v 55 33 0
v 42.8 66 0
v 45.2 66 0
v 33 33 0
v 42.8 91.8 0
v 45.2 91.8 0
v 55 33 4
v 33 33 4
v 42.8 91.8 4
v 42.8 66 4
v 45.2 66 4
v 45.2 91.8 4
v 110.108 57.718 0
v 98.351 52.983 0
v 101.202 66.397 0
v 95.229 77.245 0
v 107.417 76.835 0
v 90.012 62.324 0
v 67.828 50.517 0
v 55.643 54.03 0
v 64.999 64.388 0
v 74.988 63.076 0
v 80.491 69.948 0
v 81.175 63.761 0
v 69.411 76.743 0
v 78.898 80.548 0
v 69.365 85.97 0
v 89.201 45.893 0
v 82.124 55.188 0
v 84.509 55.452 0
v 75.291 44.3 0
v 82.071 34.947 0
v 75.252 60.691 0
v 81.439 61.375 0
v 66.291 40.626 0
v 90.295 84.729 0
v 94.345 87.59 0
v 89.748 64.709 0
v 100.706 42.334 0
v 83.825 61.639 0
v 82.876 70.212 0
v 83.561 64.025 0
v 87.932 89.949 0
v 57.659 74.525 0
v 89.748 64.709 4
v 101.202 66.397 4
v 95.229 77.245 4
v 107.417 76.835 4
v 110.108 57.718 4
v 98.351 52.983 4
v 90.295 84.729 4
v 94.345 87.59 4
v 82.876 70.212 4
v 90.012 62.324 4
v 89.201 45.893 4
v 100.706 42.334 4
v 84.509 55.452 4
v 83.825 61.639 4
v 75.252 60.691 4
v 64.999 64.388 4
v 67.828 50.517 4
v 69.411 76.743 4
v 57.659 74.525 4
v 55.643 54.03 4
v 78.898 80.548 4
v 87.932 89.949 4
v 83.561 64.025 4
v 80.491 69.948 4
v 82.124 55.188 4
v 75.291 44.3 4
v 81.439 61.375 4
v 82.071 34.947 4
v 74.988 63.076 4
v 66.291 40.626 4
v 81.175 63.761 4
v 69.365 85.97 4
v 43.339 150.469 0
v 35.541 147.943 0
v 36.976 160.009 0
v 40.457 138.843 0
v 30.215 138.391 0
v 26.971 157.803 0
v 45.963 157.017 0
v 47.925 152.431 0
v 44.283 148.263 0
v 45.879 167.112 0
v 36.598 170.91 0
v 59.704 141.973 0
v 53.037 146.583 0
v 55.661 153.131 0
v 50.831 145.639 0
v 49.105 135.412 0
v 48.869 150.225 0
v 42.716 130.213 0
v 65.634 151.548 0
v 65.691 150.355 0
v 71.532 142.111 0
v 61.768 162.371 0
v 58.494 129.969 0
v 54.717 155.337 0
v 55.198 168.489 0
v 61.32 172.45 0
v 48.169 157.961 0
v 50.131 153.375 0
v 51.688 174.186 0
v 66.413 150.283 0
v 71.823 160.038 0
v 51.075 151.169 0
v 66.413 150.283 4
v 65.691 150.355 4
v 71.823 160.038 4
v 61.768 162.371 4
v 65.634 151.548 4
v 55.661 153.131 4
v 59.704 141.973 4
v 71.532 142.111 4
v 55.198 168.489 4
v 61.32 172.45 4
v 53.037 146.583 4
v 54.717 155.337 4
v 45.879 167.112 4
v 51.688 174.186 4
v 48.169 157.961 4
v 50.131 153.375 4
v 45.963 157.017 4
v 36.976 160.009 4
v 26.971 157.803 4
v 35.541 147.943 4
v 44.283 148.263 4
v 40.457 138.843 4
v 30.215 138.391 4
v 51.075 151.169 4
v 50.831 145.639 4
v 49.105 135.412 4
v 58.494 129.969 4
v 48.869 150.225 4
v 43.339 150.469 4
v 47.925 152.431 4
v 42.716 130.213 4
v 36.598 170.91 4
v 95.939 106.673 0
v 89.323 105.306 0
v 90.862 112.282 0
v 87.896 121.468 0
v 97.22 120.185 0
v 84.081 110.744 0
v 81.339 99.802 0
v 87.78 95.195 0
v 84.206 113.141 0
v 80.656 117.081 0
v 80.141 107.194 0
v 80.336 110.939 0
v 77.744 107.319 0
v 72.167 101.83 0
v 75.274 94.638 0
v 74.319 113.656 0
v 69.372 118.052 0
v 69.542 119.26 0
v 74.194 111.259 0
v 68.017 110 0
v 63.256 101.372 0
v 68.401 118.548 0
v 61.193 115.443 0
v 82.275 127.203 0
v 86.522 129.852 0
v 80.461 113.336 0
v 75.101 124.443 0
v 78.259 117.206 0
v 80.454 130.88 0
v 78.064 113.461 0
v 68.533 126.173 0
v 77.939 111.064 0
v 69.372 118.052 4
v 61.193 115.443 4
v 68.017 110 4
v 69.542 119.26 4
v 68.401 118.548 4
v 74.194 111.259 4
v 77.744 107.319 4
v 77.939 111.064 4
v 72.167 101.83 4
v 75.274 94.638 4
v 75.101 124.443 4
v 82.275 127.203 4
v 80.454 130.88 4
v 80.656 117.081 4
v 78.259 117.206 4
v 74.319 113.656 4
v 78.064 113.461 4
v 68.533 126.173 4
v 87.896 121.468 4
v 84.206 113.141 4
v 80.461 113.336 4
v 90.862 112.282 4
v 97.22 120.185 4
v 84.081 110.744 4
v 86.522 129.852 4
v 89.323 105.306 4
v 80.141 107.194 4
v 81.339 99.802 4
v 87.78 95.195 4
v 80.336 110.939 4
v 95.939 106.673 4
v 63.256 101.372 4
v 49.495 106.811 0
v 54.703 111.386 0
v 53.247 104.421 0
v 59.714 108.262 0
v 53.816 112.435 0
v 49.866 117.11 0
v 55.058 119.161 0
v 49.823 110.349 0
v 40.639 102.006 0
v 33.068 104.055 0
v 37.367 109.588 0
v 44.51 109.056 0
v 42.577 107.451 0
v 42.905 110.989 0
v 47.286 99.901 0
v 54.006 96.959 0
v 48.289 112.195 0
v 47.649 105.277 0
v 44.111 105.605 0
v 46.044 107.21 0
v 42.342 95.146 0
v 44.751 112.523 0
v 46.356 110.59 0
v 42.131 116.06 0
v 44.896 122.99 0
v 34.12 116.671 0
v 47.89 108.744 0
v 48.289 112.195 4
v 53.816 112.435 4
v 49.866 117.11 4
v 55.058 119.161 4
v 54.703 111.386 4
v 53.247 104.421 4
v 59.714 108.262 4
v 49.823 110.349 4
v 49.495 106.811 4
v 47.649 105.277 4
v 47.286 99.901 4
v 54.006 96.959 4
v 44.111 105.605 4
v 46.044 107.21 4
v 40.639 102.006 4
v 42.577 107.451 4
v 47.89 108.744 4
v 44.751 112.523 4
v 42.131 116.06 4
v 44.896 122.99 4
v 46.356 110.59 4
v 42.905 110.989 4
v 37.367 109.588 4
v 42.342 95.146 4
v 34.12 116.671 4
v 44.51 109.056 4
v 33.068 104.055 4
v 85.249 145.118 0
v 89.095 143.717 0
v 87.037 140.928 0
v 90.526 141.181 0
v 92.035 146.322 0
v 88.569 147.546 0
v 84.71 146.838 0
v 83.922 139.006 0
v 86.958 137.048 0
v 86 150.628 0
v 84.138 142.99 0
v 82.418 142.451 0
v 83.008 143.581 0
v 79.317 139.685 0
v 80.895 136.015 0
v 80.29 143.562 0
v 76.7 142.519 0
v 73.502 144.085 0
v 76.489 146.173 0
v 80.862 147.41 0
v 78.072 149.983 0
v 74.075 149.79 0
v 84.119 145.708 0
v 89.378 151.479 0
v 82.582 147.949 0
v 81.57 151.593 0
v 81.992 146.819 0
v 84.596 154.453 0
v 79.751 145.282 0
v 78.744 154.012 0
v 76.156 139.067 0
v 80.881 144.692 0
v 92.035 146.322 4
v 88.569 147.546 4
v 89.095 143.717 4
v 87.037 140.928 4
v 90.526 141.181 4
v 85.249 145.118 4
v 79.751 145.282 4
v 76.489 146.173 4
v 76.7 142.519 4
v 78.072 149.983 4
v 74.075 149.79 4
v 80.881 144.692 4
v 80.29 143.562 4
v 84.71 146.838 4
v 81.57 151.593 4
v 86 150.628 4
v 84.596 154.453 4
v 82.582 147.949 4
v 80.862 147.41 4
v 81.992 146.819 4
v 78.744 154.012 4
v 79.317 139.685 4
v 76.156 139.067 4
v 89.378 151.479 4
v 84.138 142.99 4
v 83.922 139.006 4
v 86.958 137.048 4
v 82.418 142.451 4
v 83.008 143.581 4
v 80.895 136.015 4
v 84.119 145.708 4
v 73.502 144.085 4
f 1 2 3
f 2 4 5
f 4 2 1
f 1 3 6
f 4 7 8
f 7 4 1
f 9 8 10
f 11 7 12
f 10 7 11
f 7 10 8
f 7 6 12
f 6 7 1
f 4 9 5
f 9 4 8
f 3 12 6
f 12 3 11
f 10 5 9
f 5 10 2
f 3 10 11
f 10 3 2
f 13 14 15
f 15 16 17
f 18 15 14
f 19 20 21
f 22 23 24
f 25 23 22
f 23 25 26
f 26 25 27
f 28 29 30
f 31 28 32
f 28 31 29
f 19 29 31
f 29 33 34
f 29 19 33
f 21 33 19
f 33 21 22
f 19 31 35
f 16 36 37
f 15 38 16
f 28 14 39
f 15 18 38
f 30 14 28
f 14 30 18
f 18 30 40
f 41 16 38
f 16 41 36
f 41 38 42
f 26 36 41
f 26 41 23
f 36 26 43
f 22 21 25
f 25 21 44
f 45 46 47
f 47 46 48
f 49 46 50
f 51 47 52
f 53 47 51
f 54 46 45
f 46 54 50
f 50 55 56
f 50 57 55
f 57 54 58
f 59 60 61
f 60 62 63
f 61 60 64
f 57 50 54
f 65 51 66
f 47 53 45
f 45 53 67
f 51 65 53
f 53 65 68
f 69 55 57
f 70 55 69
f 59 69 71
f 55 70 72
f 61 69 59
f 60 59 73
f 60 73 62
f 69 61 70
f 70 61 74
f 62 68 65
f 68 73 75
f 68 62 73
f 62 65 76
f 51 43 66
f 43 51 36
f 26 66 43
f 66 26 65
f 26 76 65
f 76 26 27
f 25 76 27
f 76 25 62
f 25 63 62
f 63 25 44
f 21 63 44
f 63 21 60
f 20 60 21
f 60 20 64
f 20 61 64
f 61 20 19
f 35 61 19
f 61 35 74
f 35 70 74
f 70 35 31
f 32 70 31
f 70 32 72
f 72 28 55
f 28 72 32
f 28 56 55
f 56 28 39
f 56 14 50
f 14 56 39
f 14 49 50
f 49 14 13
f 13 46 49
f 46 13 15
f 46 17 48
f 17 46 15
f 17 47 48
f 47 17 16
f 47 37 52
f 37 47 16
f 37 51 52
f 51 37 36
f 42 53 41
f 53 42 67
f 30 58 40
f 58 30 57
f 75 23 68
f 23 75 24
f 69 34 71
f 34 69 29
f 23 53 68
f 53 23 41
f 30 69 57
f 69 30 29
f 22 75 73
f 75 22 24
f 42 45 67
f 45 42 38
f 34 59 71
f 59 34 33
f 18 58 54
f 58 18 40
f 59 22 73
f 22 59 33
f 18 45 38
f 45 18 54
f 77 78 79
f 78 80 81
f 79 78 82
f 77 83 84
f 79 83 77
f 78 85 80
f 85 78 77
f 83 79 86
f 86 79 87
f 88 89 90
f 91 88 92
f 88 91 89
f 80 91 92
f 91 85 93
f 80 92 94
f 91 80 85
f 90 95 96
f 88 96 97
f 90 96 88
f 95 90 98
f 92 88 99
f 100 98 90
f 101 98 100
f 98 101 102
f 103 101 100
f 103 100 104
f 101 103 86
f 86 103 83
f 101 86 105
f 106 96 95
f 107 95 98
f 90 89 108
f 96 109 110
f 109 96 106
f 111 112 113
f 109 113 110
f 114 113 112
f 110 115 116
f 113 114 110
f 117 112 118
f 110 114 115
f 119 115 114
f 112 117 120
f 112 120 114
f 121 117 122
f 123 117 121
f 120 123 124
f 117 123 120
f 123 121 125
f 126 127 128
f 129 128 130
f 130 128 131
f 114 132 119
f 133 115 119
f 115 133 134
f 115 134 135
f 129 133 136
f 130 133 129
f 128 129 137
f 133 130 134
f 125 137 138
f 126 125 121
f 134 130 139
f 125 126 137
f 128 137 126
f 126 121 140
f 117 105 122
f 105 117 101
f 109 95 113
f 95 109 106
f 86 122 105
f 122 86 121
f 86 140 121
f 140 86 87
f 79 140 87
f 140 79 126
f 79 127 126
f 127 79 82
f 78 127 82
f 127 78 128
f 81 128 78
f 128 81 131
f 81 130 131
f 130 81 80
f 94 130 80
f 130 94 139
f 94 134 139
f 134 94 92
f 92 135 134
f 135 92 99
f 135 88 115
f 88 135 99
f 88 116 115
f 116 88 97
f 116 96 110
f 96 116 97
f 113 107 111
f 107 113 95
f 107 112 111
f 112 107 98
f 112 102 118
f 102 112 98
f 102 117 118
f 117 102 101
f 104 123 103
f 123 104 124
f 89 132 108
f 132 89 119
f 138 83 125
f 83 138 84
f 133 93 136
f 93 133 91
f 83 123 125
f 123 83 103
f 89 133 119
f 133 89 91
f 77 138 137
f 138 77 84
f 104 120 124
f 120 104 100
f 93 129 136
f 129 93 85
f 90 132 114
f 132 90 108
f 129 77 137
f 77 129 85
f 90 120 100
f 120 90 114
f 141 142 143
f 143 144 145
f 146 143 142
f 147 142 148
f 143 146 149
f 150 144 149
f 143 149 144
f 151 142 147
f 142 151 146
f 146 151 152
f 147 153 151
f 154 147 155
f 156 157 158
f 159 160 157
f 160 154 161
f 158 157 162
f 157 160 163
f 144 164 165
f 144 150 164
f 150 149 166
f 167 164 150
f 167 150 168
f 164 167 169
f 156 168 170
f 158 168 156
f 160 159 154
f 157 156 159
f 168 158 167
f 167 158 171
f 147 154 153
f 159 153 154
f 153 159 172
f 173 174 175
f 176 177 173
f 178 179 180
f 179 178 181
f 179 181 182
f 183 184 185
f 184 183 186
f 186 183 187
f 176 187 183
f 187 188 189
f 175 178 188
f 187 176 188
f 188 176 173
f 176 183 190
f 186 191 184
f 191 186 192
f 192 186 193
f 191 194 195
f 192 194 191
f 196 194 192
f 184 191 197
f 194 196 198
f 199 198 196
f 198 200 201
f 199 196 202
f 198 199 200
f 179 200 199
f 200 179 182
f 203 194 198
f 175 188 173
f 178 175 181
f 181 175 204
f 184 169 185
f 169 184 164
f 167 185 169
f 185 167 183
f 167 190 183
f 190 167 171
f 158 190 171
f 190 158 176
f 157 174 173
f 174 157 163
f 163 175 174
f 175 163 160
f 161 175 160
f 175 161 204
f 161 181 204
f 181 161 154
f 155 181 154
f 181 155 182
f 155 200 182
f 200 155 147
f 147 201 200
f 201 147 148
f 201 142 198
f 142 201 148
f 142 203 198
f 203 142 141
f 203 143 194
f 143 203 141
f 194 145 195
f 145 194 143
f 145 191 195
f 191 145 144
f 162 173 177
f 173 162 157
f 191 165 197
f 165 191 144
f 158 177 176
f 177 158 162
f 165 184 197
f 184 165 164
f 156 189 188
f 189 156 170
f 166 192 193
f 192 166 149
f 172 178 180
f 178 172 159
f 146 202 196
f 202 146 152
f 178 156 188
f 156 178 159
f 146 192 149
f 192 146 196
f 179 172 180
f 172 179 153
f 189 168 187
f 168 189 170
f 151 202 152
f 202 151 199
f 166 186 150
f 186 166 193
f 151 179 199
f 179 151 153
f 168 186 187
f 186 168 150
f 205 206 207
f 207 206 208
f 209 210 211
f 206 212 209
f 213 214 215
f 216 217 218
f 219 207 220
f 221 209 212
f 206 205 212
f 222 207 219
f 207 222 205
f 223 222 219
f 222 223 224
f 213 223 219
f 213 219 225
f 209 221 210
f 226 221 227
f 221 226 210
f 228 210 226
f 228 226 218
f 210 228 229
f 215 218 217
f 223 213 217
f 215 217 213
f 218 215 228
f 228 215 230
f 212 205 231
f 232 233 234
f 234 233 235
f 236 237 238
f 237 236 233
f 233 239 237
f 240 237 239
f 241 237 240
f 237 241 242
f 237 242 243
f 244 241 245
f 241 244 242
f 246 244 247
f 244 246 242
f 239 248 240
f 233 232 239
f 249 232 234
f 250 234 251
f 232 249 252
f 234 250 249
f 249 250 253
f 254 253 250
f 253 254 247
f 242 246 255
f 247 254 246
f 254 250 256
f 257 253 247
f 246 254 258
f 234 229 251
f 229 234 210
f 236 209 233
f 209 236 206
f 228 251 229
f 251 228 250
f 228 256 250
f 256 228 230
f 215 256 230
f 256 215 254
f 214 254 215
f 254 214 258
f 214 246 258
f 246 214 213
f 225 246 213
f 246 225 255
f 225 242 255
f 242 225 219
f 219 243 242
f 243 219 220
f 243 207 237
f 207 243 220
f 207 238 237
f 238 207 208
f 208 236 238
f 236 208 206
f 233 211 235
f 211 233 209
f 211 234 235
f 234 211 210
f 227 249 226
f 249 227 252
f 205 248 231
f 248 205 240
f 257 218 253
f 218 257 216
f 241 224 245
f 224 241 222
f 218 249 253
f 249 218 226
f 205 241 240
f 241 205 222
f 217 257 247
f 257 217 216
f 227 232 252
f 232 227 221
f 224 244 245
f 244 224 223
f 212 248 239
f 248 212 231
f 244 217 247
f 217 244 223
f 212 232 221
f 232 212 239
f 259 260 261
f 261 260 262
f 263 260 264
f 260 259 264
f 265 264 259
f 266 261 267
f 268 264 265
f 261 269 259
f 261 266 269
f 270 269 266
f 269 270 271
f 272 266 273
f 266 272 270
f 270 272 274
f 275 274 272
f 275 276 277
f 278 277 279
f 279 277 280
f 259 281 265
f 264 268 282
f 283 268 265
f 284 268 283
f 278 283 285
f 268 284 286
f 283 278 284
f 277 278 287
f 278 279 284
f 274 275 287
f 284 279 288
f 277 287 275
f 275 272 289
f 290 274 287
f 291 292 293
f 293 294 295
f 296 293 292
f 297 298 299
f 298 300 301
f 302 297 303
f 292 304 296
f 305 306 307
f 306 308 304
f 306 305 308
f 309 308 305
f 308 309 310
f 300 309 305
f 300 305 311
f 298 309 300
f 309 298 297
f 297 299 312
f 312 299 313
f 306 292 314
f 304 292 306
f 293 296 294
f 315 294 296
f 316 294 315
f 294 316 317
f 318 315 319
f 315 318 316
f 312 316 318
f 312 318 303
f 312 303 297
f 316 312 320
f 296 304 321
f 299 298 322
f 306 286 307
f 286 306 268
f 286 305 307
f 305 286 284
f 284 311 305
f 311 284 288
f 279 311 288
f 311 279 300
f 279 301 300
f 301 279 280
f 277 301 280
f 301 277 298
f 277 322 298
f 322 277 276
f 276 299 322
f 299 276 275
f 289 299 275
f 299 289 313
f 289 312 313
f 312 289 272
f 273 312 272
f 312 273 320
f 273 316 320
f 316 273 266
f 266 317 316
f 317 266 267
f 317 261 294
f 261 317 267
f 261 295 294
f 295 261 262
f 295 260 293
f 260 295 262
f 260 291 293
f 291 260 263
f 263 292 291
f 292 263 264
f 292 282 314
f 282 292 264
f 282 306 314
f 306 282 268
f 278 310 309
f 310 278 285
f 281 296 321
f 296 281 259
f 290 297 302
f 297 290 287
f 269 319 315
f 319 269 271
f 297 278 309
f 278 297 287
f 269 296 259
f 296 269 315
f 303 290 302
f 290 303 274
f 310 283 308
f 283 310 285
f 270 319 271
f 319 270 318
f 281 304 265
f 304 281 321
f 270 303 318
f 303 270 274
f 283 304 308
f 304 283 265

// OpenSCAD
/*
 * Christmas Tree Generator
 * By Craig Wood
 *
 * Copyright 2019 Craig Wood - http://github.com/w3ace
 * This program is free software: you can redistribute it and/or modify
 * it under the terms of the GNU General Public License as published by
 * the Free Software Foundation, either version 3 of the License, or
 * (at your option) any later version.
 *
 * This program is distributed in thehope that it will be useful,
 * but WITHOUT ANY WARRANTY; without even the implied warranty of
 * MERCHANTABILITY or FITNESS FOR A PARTICULAR PURPOSE.  See the
 * GNU General Public License for more details.
 *
 * See <http://www.gnu.org/licenses/>.

 */

height=66;
thickness=4;

trunk(height=height, thickness=thickness);
branch(height=height*.90, x=height*1.25, y=height*.95, thickness=thickness);
branch(height=height*.75, x=height*.75, y=height*2.3, thickness=thickness);
branch(height=height*.6, x=height*1.2, y=height*1.7, thickness=thickness);
branch(height=height*.45, x=height*.7, y=height*1.65, thickness=thickness);
branch(height=height*.3, x=height*1.25, y=height*2.2, thickness=thickness);

// Variance for the branch polygons 

function variance (height) = rands(-height,height,1)[0]/10;

// Make trunk pieces

module trunk (height=66, thickness=2)
{
	x = height/2;
	y = height/2;

	difference()
	{
		linear_extrude (height=thickness)
		{
			polygon(points=[
				[x,y],
				[x+height/3,y],
				[x+height/6,y+height]
			]);
		}
		translate([x+height/6,y+height*3/4,thickness/2])
			cube([2.4,height/2,thickness],true);
	}
}

// Module to create a horizontal branch

module branch (height=80, x=0, y=0, thickness=2)
{
	p = rands(7,11,1)[0];

	// Put branch in proper location 
	translate ([x,y,0])
	{
		difference() 
		{
			// Random number of branches
			for(i=[360/p:390/p:390]) 
			{
				rotate([0,0,i])
				linear_extrude (height=thickness)
				{
				polygon(points=[
				 				[-(height/5)+variance(height/2),(height/5)+variance(height/2)],	
								[(height/5)+variance(height/2),-(height/5)+variance(height/2)],
				 	  		[(height/3)+variance(height/4),(height/3)+variance(height/4)]
						]);
				}
			}

			// Trunk Slot
			rotate ([0,0,rands(1,90,1)[0]])
			translate([0,0,thickness/2])
			union ()
			{
				cube([2.4,height/4,thickness],true);
				rotate([0,0,90])
					cube([2.4,height/4,thickness],true);				
			}
		}
	}
}
